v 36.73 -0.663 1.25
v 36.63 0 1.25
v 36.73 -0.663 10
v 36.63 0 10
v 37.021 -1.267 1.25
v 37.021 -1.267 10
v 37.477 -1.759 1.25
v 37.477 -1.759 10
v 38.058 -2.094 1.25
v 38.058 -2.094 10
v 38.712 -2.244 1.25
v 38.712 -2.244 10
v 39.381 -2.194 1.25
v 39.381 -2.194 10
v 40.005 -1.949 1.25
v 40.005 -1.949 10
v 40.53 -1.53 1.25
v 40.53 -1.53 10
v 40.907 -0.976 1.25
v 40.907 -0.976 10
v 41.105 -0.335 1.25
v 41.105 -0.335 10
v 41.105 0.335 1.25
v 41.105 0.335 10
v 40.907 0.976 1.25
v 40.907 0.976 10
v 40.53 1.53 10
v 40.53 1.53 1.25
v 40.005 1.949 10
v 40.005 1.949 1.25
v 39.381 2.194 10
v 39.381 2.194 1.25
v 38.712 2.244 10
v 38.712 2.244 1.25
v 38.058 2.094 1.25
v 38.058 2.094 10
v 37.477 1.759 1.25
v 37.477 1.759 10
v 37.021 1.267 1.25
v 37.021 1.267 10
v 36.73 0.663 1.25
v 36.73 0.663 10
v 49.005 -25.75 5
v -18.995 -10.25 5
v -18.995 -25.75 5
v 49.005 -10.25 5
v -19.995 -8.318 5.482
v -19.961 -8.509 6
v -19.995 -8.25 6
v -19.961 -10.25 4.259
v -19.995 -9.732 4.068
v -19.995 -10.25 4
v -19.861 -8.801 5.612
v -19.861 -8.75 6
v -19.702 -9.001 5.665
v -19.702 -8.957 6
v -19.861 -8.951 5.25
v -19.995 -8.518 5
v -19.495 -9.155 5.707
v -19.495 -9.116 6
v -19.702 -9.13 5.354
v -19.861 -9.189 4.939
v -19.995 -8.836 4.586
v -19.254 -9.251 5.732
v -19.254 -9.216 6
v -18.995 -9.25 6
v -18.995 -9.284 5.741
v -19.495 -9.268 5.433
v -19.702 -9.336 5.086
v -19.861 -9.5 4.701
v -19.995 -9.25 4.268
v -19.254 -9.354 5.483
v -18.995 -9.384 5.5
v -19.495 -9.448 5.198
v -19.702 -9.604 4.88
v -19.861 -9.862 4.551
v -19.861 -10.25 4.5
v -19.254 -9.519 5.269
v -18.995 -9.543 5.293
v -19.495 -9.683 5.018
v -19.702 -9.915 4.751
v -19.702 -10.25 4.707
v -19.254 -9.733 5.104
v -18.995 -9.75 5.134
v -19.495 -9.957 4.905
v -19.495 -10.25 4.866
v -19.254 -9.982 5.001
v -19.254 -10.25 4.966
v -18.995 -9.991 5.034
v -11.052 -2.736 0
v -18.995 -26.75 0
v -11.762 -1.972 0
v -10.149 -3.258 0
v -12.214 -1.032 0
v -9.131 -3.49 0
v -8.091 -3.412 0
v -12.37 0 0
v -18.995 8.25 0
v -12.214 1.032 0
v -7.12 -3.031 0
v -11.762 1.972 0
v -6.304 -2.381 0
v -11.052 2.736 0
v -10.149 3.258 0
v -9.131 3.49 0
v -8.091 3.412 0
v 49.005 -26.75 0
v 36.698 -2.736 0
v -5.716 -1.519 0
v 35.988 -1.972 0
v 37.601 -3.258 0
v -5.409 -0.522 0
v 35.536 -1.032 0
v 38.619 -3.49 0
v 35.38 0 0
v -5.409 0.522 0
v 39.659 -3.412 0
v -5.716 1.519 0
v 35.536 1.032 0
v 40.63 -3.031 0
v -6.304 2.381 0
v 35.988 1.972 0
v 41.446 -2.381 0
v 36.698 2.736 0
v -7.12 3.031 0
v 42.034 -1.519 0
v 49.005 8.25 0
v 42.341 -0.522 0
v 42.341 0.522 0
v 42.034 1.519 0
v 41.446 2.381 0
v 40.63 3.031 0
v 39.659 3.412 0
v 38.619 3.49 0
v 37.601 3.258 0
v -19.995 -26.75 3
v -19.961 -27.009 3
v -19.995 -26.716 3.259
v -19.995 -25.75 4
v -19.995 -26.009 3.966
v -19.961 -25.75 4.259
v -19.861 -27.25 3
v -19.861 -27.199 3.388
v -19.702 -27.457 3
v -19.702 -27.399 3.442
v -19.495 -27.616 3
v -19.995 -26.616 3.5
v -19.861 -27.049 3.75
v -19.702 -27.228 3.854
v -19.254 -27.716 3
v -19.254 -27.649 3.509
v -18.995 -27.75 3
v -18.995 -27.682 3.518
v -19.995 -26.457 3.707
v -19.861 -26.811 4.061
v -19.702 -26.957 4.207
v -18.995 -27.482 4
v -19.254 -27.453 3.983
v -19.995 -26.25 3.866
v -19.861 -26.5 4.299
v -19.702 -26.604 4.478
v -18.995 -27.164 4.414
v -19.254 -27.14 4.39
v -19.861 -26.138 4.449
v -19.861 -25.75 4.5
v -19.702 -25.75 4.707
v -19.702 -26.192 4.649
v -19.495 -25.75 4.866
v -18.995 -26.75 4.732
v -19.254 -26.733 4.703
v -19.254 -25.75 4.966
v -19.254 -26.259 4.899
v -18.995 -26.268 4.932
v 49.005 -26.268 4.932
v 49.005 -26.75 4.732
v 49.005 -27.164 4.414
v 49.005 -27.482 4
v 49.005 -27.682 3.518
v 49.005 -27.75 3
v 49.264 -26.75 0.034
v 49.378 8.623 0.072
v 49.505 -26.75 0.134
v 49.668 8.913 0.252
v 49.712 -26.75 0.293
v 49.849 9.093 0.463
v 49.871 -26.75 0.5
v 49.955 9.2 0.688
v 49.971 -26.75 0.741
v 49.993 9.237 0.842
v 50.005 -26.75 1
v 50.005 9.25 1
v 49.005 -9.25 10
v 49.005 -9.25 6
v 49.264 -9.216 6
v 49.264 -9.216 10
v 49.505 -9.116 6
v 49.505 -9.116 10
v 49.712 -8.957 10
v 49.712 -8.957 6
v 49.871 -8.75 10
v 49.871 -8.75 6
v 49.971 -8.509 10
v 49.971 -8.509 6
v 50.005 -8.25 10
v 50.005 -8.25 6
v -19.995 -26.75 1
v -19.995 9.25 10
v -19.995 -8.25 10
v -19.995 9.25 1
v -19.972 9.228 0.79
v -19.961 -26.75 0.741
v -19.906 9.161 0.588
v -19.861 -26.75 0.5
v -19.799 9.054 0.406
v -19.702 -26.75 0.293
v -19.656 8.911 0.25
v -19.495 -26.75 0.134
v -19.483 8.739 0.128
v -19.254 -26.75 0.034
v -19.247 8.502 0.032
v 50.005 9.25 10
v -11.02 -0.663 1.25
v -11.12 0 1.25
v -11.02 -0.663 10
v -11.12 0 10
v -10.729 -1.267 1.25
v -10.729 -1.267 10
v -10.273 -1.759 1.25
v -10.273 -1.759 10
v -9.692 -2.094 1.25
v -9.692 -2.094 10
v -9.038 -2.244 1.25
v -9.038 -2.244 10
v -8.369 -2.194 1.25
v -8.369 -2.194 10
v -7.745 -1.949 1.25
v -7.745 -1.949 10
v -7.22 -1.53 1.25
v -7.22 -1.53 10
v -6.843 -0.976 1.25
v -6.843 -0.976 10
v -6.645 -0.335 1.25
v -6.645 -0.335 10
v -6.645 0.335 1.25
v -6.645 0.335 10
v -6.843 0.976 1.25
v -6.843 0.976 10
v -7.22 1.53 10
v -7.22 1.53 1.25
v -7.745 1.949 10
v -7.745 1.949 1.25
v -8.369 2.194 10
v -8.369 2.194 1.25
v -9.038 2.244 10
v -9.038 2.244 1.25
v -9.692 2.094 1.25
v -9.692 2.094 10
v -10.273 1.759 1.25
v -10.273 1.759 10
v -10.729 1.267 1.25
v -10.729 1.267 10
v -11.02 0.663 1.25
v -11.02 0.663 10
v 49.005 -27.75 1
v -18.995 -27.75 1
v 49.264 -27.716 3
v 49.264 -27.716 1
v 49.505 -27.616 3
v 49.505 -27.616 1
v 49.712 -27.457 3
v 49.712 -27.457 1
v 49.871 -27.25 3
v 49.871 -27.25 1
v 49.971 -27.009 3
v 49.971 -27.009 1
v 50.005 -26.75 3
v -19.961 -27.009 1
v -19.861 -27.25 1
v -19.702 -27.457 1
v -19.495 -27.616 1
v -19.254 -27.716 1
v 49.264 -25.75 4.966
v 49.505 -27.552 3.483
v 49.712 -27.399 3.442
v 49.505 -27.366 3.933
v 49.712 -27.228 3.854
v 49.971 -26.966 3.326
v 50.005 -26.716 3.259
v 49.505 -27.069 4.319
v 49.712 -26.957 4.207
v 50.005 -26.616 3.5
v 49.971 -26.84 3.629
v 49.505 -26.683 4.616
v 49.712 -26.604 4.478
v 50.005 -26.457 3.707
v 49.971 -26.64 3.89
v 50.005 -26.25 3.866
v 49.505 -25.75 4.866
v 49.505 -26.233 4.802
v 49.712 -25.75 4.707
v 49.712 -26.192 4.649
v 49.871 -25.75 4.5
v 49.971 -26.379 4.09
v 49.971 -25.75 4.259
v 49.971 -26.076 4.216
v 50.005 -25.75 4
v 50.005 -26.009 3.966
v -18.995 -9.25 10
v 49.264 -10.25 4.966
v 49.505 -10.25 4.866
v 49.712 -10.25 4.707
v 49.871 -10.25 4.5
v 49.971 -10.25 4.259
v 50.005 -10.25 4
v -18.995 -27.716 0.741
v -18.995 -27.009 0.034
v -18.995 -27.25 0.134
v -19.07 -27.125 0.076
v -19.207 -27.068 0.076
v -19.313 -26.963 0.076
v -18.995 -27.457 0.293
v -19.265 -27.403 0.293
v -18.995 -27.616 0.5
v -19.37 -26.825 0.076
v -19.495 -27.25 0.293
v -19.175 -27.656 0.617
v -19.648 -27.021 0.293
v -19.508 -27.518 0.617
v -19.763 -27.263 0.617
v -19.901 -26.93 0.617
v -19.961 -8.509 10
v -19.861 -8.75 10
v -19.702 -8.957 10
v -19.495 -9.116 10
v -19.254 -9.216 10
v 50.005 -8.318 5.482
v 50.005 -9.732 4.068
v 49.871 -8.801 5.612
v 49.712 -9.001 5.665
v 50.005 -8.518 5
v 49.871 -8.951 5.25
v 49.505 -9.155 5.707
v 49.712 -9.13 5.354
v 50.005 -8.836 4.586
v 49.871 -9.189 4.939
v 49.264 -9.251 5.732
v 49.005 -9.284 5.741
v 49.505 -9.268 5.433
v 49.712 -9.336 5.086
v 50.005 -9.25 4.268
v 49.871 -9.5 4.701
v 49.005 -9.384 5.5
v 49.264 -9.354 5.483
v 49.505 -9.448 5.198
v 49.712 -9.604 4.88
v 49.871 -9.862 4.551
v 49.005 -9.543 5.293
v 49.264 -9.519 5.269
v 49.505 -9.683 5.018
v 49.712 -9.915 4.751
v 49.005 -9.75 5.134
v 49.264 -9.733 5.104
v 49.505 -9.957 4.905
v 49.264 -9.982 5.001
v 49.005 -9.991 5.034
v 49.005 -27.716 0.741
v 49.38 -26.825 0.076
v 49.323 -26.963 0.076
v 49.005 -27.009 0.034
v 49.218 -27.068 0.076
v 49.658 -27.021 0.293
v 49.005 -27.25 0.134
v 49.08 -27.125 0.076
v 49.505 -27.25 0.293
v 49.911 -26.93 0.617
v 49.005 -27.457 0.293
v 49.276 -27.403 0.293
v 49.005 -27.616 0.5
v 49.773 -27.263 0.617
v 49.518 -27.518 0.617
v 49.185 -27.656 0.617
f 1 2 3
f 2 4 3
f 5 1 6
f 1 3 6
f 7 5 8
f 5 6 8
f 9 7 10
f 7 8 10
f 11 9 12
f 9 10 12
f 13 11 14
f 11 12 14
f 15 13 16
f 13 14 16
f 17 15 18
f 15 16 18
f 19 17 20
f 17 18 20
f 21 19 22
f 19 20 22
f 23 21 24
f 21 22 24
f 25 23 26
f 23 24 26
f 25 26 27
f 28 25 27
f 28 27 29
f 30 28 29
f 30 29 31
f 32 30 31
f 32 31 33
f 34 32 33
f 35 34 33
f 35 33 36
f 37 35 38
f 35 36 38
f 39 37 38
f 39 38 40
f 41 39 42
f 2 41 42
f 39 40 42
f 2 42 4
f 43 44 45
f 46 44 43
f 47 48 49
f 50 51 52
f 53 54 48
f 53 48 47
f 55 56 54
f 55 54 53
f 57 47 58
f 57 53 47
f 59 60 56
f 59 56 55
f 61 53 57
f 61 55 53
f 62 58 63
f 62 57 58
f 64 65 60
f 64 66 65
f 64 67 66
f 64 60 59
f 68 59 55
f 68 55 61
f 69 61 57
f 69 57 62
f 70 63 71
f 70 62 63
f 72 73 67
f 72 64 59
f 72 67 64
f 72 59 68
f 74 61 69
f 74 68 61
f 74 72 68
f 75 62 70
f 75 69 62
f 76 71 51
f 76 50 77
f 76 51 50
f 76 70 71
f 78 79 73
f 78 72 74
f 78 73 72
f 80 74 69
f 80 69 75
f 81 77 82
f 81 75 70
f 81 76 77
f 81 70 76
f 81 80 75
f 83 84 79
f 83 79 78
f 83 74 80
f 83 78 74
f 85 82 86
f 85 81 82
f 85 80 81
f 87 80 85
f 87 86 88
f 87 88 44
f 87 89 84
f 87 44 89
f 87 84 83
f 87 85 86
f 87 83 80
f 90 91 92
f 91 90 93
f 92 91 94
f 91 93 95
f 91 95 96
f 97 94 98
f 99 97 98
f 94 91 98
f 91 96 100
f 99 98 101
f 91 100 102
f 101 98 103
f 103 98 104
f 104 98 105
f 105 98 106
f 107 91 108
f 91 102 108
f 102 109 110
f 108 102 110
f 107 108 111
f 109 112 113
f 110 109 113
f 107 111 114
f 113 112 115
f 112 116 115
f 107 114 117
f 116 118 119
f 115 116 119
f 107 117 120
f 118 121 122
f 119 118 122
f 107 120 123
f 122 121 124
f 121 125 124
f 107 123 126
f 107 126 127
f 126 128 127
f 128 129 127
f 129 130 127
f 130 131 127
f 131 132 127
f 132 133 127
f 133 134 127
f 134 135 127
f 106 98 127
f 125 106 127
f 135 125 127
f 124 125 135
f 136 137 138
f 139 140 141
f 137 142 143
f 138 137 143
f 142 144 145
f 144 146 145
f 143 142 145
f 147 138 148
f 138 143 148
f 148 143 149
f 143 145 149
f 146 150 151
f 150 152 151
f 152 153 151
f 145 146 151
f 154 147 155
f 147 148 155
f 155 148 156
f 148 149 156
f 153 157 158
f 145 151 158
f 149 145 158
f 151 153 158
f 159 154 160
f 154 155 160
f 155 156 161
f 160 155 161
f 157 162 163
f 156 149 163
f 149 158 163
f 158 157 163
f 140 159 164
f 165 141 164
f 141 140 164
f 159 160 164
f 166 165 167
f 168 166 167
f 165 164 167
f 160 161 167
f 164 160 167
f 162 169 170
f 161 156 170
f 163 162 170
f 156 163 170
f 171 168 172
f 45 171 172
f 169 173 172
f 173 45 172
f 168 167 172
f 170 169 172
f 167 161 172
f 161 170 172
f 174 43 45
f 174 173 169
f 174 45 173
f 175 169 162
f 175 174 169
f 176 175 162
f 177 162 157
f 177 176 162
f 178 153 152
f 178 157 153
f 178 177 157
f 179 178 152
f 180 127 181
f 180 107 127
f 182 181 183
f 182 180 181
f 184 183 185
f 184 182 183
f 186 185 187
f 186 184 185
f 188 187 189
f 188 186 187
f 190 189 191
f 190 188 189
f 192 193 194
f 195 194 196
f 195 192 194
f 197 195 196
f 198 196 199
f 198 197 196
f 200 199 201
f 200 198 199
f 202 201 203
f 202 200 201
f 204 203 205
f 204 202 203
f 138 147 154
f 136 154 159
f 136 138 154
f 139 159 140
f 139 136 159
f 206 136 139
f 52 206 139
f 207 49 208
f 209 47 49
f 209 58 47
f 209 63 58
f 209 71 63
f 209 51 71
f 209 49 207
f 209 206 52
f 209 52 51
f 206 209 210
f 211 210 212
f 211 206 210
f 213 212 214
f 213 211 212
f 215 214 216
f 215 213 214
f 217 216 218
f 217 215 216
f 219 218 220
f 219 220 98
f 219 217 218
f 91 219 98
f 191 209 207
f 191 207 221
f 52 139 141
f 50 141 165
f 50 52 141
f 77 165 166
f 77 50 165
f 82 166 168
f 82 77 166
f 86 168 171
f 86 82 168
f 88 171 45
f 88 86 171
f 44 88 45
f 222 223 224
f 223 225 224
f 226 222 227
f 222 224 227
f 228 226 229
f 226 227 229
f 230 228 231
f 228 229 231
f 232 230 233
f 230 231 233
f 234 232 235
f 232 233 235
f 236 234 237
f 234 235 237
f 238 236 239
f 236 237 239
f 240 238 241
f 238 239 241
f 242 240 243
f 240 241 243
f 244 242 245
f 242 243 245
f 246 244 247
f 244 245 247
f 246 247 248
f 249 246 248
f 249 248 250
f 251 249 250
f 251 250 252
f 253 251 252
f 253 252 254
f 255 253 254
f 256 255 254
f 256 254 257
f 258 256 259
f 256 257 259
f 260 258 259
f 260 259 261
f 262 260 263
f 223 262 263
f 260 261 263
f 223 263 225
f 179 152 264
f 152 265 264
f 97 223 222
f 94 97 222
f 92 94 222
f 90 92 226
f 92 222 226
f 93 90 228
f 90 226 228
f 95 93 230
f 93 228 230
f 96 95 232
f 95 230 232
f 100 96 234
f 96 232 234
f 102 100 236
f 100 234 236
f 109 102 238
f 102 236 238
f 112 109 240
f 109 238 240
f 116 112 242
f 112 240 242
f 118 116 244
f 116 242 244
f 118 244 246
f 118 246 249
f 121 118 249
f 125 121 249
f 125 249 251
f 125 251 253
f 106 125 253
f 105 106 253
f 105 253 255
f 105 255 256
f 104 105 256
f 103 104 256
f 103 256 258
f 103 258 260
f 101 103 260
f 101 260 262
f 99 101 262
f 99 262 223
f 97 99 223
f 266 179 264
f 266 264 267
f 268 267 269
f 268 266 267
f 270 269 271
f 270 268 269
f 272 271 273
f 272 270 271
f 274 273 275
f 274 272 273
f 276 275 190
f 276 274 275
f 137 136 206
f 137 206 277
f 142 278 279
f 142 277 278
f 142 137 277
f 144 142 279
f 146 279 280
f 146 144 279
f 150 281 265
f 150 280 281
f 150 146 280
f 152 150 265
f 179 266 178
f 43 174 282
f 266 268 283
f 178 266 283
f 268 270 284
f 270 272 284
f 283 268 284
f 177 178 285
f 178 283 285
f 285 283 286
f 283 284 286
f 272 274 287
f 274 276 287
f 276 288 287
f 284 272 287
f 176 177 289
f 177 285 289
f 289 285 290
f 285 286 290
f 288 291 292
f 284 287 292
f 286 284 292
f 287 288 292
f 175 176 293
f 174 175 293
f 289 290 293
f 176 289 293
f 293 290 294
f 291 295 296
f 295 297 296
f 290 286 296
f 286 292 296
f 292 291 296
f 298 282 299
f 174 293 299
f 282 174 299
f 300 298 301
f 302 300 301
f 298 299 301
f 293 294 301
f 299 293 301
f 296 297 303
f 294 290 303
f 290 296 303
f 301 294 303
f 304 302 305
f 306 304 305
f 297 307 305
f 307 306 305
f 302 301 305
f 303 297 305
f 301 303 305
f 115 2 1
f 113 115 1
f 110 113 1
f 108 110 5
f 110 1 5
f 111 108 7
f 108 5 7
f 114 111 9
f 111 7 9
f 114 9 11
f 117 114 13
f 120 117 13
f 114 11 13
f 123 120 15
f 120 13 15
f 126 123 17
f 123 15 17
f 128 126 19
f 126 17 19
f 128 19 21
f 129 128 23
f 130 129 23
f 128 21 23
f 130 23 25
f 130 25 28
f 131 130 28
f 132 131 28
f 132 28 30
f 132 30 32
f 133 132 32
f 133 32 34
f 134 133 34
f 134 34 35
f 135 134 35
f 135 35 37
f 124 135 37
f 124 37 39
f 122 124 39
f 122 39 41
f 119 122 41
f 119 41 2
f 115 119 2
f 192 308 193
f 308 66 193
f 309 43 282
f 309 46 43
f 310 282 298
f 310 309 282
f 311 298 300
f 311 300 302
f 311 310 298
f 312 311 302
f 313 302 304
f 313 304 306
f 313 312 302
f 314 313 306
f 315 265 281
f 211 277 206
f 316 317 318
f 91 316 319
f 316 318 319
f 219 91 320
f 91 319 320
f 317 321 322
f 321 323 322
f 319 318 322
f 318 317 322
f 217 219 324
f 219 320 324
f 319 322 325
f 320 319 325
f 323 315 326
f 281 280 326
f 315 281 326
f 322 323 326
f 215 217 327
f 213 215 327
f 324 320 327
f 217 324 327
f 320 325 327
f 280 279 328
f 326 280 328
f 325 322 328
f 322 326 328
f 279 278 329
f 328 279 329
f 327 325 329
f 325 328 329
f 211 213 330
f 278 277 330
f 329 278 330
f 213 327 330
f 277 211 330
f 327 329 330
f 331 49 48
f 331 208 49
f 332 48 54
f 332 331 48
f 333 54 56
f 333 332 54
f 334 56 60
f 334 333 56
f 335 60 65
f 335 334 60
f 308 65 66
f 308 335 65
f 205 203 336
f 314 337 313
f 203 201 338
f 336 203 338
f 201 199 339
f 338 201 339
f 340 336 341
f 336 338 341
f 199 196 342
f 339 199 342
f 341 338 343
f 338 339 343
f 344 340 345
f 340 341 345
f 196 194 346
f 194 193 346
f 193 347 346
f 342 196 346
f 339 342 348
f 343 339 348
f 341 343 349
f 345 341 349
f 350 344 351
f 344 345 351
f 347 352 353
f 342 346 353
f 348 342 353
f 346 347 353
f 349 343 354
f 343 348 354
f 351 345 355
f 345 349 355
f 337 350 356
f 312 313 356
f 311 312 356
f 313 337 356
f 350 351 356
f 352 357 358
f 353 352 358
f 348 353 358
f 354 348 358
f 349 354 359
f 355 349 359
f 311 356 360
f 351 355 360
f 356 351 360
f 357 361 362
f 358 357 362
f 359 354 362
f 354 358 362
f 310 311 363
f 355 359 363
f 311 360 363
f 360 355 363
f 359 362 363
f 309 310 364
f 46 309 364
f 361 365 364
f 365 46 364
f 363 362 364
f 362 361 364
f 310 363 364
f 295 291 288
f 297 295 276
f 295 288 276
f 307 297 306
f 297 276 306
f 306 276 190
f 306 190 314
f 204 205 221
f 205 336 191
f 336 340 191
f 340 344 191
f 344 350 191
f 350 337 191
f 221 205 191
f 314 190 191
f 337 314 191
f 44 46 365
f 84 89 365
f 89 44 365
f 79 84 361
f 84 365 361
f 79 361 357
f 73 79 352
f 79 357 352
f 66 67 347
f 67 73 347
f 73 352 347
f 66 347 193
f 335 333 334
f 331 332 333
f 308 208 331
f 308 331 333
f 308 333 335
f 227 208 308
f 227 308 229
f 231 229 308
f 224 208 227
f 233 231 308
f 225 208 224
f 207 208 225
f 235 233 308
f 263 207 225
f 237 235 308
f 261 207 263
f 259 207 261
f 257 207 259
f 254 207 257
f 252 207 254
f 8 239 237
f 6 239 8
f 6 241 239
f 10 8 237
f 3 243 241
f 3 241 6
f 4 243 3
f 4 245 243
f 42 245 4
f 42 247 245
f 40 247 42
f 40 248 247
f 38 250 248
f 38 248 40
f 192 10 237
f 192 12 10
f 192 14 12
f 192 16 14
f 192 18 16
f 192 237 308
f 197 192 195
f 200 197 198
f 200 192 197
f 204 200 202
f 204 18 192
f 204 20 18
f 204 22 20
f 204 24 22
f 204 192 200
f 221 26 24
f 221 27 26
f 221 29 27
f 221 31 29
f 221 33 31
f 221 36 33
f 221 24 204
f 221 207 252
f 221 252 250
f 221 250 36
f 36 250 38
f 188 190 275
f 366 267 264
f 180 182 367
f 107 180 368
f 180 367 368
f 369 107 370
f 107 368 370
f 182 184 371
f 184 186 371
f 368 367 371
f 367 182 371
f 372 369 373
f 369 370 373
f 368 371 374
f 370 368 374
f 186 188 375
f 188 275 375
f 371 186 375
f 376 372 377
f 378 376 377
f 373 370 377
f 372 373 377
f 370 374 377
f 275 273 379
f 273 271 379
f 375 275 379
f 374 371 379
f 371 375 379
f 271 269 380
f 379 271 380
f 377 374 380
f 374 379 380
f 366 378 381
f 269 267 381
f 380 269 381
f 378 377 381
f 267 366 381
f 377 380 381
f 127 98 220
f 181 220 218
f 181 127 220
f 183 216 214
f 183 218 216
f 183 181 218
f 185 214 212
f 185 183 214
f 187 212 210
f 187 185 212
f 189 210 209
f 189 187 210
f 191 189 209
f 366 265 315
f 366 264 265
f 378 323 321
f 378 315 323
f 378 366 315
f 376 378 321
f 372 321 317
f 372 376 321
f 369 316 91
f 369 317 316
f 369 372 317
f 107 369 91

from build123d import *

# Parameters (mm, degrees)
F0_W           = 70
F0_H           = 18.5
F1_DEPTH       = 10
F2_DEPTH       = 5
F3_R           = 2
F4_R           = 1
F5_D           = 4.5
F5_CSINK_D     = 7
F5_CSINK_ANGLE = 90


with BuildPart() as f1:
    # F0 (on Top) → F1 (new body)
    with BuildSketch(Plane.XY):
        with Locations((15.0051557424, 0)):
            Rectangle(F0_W, F0_H)
    extrude(amount=F1_DEPTH)

    # F0 (on Top) → F2 (join)
    with BuildSketch(Plane.XY):
        with Locations((15.0051557424, -18.5)):
            Rectangle(F0_W, F0_H)
    extrude(amount=F2_DEPTH)

    # F3
    f3_edges = [f1.edges().sort_by_distance(p)[0] for p in [
        (15.005156, -27.75, 5),
    ]]
    fillet(f3_edges, radius=F3_R)

    # F4
    f4_edges = [f1.edges().sort_by_distance(p)[0] for p in [
        (50.005156, -17.5, 5),
        (-19.994844, -17.5, 5),
        (50.005156, -9.25, 0),
        (15.005156, -27.75, 0),
        (-19.994844, -9.25, 0),
        (15.005156, 9.25, 0),
        (15.005156, -9.25, 5),
        (-19.994844, -27.164214, 4.414214),
        (-19.994844, -9.25, 7.5),
        (50.005156, -27.164214, 4.414214),
        (50.005156, -9.25, 7.5),
    ]]
    fillet(f4_edges, radius=F4_R)

    # F5 (through all)
    with Locations(Plane(origin=(0, 0, 0), x_dir=(1, 0, 0), z_dir=(0, 0, -1))):
        with Locations((-8.8698442576, 0), (38.8801557424, 0)):
            CounterSinkHole(F5_D / 2, F5_CSINK_D / 2, counter_sink_angle=F5_CSINK_ANGLE)


solid = f1.part
